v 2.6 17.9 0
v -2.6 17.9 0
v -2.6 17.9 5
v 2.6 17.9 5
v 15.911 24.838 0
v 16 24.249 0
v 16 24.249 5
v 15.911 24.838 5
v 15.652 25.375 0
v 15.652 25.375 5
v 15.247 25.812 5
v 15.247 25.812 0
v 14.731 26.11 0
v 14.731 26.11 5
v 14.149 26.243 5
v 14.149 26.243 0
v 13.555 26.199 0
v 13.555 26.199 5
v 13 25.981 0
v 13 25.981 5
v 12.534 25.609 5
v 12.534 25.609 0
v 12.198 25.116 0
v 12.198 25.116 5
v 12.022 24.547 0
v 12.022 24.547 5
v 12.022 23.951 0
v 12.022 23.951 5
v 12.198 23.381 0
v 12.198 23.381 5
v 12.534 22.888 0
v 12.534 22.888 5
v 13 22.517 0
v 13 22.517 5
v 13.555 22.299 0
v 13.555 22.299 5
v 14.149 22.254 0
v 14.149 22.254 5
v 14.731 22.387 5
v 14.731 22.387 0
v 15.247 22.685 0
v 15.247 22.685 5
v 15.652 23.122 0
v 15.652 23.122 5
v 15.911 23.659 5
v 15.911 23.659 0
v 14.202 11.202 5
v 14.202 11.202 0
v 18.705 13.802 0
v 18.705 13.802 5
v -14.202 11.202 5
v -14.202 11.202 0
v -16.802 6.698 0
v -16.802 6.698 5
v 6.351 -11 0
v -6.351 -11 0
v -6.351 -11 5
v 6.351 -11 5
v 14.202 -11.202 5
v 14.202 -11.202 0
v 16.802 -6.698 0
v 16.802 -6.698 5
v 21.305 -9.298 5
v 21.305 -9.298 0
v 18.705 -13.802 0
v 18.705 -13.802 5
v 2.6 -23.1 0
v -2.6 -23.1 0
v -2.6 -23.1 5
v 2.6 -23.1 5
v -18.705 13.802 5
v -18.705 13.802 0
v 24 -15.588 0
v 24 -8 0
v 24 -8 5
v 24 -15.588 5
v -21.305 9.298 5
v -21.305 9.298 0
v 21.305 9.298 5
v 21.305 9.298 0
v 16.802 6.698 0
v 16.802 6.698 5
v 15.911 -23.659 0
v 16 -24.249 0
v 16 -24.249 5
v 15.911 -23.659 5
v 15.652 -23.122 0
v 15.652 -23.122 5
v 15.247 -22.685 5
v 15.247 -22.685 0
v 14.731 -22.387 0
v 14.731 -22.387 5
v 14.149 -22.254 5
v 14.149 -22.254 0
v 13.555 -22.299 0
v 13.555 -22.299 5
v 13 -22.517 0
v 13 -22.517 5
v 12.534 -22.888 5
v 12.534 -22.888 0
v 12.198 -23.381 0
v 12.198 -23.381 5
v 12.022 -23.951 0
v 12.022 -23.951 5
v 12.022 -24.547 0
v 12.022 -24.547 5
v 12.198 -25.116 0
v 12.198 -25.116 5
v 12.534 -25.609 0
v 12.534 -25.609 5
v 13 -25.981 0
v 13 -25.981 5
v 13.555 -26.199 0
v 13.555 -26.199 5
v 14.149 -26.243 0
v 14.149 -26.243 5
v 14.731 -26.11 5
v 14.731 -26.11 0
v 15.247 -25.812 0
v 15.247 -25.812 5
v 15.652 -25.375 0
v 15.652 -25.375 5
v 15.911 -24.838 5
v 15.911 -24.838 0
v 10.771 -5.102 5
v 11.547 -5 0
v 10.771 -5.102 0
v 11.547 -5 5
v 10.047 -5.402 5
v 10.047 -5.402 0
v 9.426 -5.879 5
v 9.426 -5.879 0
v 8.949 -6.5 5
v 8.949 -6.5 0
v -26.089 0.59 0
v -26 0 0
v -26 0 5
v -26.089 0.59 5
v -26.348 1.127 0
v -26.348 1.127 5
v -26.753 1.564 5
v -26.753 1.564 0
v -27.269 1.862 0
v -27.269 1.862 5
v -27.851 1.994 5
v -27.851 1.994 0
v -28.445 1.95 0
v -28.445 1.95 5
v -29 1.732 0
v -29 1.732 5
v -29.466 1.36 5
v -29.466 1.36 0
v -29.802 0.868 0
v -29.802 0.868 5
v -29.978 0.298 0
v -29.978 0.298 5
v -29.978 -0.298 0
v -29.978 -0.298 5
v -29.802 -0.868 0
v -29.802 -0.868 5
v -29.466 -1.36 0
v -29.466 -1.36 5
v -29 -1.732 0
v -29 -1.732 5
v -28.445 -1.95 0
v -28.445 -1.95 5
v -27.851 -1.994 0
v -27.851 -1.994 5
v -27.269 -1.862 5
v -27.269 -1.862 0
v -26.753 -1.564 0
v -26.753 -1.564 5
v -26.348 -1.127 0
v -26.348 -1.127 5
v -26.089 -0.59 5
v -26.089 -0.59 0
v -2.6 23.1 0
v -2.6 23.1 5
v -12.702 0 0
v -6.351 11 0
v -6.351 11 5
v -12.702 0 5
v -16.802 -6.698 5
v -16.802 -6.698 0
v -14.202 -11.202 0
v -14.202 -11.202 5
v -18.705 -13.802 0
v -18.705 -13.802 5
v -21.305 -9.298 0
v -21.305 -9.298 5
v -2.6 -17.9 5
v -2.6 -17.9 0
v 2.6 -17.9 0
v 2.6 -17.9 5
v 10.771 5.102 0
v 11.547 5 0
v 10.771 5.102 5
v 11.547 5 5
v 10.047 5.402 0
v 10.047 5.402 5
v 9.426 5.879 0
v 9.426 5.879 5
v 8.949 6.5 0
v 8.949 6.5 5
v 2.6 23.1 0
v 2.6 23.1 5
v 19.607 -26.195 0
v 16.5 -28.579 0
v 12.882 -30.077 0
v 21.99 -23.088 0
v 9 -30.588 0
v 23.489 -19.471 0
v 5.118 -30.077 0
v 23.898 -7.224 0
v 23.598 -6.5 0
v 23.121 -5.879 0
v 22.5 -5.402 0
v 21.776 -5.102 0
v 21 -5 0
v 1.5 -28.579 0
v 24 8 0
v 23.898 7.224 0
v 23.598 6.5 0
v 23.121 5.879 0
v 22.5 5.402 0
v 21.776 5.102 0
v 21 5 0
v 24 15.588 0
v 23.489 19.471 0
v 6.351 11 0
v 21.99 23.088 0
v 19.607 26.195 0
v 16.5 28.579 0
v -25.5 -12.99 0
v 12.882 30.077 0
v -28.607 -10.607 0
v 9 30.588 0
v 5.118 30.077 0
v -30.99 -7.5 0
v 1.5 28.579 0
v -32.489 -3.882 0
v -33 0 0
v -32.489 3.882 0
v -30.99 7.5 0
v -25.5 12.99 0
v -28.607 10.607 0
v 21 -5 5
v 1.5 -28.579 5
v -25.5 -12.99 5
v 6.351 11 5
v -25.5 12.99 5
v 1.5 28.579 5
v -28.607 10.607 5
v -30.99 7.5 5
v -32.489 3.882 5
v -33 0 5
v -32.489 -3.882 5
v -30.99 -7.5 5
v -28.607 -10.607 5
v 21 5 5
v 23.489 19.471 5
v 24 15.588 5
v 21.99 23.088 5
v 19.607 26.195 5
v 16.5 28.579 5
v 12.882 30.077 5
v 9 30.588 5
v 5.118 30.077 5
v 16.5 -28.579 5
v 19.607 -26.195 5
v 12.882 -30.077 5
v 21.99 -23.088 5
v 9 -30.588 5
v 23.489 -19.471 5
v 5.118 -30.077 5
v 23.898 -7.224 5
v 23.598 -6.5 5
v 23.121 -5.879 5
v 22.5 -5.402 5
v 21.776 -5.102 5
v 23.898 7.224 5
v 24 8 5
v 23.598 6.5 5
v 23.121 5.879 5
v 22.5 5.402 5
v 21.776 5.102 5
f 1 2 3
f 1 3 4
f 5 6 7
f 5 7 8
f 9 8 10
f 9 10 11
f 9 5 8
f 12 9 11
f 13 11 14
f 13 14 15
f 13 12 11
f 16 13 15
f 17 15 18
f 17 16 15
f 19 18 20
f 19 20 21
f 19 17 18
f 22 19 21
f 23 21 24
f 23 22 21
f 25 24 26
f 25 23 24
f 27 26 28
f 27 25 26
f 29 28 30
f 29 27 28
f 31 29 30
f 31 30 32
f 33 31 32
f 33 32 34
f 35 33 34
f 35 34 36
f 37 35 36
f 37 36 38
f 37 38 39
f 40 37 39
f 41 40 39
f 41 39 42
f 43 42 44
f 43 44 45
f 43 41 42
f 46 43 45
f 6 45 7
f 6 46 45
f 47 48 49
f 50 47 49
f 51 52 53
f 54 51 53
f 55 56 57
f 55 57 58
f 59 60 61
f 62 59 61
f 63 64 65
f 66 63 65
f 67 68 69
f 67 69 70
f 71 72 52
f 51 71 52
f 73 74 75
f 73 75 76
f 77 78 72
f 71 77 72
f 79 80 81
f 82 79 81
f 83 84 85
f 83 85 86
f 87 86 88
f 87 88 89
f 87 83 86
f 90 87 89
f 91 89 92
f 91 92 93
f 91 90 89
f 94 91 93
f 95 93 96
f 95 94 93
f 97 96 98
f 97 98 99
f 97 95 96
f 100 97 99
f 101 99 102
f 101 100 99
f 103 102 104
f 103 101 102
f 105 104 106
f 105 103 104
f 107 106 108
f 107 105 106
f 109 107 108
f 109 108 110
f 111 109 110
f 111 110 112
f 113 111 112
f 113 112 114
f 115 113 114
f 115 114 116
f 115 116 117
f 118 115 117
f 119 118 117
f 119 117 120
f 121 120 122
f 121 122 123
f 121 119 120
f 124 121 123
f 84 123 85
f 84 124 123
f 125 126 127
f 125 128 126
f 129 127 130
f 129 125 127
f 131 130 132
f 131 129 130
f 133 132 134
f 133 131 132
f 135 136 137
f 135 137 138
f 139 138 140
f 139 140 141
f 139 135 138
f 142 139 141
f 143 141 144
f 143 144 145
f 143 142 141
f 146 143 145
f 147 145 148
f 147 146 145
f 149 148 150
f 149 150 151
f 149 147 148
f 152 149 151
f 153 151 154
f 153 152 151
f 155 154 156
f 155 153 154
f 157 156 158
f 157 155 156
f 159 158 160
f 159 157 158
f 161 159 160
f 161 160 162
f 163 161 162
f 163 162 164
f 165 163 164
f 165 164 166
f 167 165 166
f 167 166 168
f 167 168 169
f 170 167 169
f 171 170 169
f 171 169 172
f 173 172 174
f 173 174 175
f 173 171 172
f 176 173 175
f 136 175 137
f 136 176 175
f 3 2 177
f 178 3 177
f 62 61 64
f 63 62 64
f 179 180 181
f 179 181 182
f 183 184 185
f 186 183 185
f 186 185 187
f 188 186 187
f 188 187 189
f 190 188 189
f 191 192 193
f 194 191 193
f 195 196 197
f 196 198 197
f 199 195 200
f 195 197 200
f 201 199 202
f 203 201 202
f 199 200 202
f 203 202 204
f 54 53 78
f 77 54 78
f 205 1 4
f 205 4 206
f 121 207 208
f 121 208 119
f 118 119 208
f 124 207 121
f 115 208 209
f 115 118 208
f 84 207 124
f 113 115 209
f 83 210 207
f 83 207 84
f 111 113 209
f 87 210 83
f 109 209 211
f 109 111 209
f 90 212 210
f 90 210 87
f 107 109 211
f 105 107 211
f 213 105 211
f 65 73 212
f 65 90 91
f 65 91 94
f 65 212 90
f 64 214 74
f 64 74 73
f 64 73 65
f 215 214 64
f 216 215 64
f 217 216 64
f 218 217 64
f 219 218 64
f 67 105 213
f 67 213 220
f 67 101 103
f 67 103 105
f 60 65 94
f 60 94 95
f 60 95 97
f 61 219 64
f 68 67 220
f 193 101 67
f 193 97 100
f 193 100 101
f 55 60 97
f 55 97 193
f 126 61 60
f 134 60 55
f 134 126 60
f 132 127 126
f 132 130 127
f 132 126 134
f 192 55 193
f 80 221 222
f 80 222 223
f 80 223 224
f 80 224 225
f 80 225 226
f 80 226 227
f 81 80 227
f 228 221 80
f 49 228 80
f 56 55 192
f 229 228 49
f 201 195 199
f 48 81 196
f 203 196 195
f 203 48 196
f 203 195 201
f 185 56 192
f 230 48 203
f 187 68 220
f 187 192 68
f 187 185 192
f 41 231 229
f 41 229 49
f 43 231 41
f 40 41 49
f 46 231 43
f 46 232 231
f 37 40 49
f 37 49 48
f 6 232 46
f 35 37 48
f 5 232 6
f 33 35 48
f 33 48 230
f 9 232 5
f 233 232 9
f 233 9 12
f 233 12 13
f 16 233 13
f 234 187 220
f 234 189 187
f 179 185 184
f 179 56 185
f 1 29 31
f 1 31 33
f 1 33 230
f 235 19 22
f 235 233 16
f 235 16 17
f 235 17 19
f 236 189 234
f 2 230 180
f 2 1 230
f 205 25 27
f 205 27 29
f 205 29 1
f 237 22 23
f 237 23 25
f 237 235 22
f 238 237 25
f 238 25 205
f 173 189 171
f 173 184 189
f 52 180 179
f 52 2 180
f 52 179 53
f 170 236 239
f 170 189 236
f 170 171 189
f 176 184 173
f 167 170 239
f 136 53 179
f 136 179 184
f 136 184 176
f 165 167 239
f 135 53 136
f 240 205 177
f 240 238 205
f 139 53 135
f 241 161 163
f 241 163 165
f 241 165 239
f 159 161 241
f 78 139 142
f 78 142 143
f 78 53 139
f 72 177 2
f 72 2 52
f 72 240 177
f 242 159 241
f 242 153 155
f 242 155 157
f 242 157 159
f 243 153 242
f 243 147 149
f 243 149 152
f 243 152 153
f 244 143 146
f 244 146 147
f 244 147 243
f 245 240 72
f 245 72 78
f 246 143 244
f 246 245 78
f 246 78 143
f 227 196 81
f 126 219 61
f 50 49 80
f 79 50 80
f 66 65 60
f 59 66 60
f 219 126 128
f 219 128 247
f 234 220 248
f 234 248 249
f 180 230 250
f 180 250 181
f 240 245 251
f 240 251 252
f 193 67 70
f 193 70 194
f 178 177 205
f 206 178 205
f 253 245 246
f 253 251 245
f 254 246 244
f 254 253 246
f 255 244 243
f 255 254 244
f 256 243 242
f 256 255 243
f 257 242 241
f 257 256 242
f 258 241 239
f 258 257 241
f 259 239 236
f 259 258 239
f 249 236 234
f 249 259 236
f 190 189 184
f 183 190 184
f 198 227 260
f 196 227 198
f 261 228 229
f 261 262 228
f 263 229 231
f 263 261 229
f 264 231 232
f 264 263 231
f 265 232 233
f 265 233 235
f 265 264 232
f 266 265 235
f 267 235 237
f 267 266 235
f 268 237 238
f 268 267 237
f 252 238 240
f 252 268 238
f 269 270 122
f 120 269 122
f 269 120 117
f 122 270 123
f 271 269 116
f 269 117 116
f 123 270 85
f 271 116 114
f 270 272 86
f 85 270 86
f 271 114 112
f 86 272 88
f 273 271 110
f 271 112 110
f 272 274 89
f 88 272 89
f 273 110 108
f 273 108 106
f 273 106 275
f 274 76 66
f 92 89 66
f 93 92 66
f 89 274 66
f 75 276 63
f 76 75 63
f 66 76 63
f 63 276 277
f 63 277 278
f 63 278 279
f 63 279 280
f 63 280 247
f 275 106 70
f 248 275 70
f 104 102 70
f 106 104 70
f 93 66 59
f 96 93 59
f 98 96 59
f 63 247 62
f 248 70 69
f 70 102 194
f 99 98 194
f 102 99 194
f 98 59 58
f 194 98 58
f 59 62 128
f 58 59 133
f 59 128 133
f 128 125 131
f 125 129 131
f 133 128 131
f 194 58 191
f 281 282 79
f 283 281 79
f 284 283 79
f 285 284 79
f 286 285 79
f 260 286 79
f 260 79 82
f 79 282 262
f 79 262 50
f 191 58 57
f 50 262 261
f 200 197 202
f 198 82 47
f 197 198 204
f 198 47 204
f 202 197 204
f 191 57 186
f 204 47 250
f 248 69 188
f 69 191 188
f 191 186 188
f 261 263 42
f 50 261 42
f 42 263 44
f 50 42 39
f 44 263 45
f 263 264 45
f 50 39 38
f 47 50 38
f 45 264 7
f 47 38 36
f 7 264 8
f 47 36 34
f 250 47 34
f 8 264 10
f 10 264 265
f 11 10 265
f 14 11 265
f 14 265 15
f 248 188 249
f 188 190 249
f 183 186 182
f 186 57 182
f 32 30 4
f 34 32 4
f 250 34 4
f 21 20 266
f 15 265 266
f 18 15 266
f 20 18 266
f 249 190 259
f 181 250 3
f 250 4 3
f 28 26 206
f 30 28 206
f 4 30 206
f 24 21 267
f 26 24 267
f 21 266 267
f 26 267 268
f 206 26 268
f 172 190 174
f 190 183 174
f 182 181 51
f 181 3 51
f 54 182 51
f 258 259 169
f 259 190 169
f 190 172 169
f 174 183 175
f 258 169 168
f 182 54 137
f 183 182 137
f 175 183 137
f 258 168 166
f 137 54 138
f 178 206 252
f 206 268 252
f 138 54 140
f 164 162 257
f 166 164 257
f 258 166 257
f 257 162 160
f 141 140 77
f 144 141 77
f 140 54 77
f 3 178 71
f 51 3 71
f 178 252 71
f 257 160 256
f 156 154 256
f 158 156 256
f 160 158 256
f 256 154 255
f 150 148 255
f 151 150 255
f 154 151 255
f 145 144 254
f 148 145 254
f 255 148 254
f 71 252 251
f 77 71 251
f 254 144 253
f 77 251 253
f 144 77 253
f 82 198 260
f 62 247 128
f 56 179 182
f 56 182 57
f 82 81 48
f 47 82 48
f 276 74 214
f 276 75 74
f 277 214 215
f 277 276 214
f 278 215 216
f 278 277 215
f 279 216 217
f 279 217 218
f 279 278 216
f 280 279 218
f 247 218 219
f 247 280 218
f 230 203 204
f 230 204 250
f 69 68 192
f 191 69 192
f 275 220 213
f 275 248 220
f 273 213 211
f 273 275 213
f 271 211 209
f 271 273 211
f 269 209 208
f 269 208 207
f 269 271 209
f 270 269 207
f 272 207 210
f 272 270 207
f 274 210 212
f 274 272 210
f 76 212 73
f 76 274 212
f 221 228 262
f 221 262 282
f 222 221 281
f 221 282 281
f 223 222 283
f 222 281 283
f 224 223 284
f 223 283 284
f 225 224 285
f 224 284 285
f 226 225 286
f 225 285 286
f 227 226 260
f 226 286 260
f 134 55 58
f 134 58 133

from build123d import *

# Parameters (mm, degrees)
SKETCH1_R           = 2
SKETCH1_W           = 5.2
SKETCH1_H           = 5.2
BOSS_EXTRUDE1_DEPTH = 5
CONG_1_R            = 15
CONG_2_R            = 3


with BuildPart() as part:
    # Sketch1 → Boss-Extrude1 (new body)
    with BuildSketch(Plane.XY):
        Polygon((24, 5), (9.814954576, 5), (6.350852961, 11), (-6.350852961, 11), (-12.701705922, 0), (-6.350852961, -11), (6.350852961, -11), (9.814954576, -5), (24, -5), (24, -41.569219382), (-48, 0), (24, 41.569219382), align=None)
        with Locations((14, 24.248711306)):
            Circle(SKETCH1_R, mode=Mode.SUBTRACT)
        with Locations((14, -24.248711306)):
            Circle(SKETCH1_R, mode=Mode.SUBTRACT)
        with Locations((-28, 0)):
            Circle(SKETCH1_R, mode=Mode.SUBTRACT)
        with Locations((0, 20.5)):
            Rectangle(SKETCH1_W, SKETCH1_H, mode=Mode.SUBTRACT)
        Polygon((21.305186827, 9.29833395), (16.801854728, 6.69833395), (14.201854728, 11.20166605), (18.705186827, 13.80166605), align=None, mode=Mode.SUBTRACT)
        Polygon((18.705186827, -13.80166605), (14.201854728, -11.20166605), (16.801854728, -6.69833395), (21.305186827, -9.29833395), align=None, mode=Mode.SUBTRACT)
        with Locations((0, -20.5)):
            Rectangle(SKETCH1_W, SKETCH1_H, mode=Mode.SUBTRACT)
        Polygon((-21.305186827, -9.29833395), (-16.801854728, -6.69833395), (-14.201854728, -11.20166605), (-18.705186827, -13.80166605), align=None, mode=Mode.SUBTRACT)
        Polygon((-18.705186827, 13.80166605), (-14.201854728, 11.20166605), (-16.801854728, 6.69833395), (-21.305186827, 9.29833395), align=None, mode=Mode.SUBTRACT)
    extrude(amount=BOSS_EXTRUDE1_DEPTH)

    # Congé1
    cong_1_edges = [part.edges().sort_by_distance(p)[0] for p in [
        (24, -41.569219382, 2.5),
        (-48, 0, 2.5),
        (24, 41.569219382, 2.5),
    ]]
    fillet(cong_1_edges, radius=CONG_1_R)

    # Congé2
    cong_2_edges = [part.edges().sort_by_distance(p)[0] for p in [
        (24, 5, 2.5),
        (9.814954576, 5, 2.5),
        (9.814954576, -5, 2.5),
        (24, -5, 2.5),
    ]]
    fillet(cong_2_edges, radius=CONG_2_R)


solid = part.part
